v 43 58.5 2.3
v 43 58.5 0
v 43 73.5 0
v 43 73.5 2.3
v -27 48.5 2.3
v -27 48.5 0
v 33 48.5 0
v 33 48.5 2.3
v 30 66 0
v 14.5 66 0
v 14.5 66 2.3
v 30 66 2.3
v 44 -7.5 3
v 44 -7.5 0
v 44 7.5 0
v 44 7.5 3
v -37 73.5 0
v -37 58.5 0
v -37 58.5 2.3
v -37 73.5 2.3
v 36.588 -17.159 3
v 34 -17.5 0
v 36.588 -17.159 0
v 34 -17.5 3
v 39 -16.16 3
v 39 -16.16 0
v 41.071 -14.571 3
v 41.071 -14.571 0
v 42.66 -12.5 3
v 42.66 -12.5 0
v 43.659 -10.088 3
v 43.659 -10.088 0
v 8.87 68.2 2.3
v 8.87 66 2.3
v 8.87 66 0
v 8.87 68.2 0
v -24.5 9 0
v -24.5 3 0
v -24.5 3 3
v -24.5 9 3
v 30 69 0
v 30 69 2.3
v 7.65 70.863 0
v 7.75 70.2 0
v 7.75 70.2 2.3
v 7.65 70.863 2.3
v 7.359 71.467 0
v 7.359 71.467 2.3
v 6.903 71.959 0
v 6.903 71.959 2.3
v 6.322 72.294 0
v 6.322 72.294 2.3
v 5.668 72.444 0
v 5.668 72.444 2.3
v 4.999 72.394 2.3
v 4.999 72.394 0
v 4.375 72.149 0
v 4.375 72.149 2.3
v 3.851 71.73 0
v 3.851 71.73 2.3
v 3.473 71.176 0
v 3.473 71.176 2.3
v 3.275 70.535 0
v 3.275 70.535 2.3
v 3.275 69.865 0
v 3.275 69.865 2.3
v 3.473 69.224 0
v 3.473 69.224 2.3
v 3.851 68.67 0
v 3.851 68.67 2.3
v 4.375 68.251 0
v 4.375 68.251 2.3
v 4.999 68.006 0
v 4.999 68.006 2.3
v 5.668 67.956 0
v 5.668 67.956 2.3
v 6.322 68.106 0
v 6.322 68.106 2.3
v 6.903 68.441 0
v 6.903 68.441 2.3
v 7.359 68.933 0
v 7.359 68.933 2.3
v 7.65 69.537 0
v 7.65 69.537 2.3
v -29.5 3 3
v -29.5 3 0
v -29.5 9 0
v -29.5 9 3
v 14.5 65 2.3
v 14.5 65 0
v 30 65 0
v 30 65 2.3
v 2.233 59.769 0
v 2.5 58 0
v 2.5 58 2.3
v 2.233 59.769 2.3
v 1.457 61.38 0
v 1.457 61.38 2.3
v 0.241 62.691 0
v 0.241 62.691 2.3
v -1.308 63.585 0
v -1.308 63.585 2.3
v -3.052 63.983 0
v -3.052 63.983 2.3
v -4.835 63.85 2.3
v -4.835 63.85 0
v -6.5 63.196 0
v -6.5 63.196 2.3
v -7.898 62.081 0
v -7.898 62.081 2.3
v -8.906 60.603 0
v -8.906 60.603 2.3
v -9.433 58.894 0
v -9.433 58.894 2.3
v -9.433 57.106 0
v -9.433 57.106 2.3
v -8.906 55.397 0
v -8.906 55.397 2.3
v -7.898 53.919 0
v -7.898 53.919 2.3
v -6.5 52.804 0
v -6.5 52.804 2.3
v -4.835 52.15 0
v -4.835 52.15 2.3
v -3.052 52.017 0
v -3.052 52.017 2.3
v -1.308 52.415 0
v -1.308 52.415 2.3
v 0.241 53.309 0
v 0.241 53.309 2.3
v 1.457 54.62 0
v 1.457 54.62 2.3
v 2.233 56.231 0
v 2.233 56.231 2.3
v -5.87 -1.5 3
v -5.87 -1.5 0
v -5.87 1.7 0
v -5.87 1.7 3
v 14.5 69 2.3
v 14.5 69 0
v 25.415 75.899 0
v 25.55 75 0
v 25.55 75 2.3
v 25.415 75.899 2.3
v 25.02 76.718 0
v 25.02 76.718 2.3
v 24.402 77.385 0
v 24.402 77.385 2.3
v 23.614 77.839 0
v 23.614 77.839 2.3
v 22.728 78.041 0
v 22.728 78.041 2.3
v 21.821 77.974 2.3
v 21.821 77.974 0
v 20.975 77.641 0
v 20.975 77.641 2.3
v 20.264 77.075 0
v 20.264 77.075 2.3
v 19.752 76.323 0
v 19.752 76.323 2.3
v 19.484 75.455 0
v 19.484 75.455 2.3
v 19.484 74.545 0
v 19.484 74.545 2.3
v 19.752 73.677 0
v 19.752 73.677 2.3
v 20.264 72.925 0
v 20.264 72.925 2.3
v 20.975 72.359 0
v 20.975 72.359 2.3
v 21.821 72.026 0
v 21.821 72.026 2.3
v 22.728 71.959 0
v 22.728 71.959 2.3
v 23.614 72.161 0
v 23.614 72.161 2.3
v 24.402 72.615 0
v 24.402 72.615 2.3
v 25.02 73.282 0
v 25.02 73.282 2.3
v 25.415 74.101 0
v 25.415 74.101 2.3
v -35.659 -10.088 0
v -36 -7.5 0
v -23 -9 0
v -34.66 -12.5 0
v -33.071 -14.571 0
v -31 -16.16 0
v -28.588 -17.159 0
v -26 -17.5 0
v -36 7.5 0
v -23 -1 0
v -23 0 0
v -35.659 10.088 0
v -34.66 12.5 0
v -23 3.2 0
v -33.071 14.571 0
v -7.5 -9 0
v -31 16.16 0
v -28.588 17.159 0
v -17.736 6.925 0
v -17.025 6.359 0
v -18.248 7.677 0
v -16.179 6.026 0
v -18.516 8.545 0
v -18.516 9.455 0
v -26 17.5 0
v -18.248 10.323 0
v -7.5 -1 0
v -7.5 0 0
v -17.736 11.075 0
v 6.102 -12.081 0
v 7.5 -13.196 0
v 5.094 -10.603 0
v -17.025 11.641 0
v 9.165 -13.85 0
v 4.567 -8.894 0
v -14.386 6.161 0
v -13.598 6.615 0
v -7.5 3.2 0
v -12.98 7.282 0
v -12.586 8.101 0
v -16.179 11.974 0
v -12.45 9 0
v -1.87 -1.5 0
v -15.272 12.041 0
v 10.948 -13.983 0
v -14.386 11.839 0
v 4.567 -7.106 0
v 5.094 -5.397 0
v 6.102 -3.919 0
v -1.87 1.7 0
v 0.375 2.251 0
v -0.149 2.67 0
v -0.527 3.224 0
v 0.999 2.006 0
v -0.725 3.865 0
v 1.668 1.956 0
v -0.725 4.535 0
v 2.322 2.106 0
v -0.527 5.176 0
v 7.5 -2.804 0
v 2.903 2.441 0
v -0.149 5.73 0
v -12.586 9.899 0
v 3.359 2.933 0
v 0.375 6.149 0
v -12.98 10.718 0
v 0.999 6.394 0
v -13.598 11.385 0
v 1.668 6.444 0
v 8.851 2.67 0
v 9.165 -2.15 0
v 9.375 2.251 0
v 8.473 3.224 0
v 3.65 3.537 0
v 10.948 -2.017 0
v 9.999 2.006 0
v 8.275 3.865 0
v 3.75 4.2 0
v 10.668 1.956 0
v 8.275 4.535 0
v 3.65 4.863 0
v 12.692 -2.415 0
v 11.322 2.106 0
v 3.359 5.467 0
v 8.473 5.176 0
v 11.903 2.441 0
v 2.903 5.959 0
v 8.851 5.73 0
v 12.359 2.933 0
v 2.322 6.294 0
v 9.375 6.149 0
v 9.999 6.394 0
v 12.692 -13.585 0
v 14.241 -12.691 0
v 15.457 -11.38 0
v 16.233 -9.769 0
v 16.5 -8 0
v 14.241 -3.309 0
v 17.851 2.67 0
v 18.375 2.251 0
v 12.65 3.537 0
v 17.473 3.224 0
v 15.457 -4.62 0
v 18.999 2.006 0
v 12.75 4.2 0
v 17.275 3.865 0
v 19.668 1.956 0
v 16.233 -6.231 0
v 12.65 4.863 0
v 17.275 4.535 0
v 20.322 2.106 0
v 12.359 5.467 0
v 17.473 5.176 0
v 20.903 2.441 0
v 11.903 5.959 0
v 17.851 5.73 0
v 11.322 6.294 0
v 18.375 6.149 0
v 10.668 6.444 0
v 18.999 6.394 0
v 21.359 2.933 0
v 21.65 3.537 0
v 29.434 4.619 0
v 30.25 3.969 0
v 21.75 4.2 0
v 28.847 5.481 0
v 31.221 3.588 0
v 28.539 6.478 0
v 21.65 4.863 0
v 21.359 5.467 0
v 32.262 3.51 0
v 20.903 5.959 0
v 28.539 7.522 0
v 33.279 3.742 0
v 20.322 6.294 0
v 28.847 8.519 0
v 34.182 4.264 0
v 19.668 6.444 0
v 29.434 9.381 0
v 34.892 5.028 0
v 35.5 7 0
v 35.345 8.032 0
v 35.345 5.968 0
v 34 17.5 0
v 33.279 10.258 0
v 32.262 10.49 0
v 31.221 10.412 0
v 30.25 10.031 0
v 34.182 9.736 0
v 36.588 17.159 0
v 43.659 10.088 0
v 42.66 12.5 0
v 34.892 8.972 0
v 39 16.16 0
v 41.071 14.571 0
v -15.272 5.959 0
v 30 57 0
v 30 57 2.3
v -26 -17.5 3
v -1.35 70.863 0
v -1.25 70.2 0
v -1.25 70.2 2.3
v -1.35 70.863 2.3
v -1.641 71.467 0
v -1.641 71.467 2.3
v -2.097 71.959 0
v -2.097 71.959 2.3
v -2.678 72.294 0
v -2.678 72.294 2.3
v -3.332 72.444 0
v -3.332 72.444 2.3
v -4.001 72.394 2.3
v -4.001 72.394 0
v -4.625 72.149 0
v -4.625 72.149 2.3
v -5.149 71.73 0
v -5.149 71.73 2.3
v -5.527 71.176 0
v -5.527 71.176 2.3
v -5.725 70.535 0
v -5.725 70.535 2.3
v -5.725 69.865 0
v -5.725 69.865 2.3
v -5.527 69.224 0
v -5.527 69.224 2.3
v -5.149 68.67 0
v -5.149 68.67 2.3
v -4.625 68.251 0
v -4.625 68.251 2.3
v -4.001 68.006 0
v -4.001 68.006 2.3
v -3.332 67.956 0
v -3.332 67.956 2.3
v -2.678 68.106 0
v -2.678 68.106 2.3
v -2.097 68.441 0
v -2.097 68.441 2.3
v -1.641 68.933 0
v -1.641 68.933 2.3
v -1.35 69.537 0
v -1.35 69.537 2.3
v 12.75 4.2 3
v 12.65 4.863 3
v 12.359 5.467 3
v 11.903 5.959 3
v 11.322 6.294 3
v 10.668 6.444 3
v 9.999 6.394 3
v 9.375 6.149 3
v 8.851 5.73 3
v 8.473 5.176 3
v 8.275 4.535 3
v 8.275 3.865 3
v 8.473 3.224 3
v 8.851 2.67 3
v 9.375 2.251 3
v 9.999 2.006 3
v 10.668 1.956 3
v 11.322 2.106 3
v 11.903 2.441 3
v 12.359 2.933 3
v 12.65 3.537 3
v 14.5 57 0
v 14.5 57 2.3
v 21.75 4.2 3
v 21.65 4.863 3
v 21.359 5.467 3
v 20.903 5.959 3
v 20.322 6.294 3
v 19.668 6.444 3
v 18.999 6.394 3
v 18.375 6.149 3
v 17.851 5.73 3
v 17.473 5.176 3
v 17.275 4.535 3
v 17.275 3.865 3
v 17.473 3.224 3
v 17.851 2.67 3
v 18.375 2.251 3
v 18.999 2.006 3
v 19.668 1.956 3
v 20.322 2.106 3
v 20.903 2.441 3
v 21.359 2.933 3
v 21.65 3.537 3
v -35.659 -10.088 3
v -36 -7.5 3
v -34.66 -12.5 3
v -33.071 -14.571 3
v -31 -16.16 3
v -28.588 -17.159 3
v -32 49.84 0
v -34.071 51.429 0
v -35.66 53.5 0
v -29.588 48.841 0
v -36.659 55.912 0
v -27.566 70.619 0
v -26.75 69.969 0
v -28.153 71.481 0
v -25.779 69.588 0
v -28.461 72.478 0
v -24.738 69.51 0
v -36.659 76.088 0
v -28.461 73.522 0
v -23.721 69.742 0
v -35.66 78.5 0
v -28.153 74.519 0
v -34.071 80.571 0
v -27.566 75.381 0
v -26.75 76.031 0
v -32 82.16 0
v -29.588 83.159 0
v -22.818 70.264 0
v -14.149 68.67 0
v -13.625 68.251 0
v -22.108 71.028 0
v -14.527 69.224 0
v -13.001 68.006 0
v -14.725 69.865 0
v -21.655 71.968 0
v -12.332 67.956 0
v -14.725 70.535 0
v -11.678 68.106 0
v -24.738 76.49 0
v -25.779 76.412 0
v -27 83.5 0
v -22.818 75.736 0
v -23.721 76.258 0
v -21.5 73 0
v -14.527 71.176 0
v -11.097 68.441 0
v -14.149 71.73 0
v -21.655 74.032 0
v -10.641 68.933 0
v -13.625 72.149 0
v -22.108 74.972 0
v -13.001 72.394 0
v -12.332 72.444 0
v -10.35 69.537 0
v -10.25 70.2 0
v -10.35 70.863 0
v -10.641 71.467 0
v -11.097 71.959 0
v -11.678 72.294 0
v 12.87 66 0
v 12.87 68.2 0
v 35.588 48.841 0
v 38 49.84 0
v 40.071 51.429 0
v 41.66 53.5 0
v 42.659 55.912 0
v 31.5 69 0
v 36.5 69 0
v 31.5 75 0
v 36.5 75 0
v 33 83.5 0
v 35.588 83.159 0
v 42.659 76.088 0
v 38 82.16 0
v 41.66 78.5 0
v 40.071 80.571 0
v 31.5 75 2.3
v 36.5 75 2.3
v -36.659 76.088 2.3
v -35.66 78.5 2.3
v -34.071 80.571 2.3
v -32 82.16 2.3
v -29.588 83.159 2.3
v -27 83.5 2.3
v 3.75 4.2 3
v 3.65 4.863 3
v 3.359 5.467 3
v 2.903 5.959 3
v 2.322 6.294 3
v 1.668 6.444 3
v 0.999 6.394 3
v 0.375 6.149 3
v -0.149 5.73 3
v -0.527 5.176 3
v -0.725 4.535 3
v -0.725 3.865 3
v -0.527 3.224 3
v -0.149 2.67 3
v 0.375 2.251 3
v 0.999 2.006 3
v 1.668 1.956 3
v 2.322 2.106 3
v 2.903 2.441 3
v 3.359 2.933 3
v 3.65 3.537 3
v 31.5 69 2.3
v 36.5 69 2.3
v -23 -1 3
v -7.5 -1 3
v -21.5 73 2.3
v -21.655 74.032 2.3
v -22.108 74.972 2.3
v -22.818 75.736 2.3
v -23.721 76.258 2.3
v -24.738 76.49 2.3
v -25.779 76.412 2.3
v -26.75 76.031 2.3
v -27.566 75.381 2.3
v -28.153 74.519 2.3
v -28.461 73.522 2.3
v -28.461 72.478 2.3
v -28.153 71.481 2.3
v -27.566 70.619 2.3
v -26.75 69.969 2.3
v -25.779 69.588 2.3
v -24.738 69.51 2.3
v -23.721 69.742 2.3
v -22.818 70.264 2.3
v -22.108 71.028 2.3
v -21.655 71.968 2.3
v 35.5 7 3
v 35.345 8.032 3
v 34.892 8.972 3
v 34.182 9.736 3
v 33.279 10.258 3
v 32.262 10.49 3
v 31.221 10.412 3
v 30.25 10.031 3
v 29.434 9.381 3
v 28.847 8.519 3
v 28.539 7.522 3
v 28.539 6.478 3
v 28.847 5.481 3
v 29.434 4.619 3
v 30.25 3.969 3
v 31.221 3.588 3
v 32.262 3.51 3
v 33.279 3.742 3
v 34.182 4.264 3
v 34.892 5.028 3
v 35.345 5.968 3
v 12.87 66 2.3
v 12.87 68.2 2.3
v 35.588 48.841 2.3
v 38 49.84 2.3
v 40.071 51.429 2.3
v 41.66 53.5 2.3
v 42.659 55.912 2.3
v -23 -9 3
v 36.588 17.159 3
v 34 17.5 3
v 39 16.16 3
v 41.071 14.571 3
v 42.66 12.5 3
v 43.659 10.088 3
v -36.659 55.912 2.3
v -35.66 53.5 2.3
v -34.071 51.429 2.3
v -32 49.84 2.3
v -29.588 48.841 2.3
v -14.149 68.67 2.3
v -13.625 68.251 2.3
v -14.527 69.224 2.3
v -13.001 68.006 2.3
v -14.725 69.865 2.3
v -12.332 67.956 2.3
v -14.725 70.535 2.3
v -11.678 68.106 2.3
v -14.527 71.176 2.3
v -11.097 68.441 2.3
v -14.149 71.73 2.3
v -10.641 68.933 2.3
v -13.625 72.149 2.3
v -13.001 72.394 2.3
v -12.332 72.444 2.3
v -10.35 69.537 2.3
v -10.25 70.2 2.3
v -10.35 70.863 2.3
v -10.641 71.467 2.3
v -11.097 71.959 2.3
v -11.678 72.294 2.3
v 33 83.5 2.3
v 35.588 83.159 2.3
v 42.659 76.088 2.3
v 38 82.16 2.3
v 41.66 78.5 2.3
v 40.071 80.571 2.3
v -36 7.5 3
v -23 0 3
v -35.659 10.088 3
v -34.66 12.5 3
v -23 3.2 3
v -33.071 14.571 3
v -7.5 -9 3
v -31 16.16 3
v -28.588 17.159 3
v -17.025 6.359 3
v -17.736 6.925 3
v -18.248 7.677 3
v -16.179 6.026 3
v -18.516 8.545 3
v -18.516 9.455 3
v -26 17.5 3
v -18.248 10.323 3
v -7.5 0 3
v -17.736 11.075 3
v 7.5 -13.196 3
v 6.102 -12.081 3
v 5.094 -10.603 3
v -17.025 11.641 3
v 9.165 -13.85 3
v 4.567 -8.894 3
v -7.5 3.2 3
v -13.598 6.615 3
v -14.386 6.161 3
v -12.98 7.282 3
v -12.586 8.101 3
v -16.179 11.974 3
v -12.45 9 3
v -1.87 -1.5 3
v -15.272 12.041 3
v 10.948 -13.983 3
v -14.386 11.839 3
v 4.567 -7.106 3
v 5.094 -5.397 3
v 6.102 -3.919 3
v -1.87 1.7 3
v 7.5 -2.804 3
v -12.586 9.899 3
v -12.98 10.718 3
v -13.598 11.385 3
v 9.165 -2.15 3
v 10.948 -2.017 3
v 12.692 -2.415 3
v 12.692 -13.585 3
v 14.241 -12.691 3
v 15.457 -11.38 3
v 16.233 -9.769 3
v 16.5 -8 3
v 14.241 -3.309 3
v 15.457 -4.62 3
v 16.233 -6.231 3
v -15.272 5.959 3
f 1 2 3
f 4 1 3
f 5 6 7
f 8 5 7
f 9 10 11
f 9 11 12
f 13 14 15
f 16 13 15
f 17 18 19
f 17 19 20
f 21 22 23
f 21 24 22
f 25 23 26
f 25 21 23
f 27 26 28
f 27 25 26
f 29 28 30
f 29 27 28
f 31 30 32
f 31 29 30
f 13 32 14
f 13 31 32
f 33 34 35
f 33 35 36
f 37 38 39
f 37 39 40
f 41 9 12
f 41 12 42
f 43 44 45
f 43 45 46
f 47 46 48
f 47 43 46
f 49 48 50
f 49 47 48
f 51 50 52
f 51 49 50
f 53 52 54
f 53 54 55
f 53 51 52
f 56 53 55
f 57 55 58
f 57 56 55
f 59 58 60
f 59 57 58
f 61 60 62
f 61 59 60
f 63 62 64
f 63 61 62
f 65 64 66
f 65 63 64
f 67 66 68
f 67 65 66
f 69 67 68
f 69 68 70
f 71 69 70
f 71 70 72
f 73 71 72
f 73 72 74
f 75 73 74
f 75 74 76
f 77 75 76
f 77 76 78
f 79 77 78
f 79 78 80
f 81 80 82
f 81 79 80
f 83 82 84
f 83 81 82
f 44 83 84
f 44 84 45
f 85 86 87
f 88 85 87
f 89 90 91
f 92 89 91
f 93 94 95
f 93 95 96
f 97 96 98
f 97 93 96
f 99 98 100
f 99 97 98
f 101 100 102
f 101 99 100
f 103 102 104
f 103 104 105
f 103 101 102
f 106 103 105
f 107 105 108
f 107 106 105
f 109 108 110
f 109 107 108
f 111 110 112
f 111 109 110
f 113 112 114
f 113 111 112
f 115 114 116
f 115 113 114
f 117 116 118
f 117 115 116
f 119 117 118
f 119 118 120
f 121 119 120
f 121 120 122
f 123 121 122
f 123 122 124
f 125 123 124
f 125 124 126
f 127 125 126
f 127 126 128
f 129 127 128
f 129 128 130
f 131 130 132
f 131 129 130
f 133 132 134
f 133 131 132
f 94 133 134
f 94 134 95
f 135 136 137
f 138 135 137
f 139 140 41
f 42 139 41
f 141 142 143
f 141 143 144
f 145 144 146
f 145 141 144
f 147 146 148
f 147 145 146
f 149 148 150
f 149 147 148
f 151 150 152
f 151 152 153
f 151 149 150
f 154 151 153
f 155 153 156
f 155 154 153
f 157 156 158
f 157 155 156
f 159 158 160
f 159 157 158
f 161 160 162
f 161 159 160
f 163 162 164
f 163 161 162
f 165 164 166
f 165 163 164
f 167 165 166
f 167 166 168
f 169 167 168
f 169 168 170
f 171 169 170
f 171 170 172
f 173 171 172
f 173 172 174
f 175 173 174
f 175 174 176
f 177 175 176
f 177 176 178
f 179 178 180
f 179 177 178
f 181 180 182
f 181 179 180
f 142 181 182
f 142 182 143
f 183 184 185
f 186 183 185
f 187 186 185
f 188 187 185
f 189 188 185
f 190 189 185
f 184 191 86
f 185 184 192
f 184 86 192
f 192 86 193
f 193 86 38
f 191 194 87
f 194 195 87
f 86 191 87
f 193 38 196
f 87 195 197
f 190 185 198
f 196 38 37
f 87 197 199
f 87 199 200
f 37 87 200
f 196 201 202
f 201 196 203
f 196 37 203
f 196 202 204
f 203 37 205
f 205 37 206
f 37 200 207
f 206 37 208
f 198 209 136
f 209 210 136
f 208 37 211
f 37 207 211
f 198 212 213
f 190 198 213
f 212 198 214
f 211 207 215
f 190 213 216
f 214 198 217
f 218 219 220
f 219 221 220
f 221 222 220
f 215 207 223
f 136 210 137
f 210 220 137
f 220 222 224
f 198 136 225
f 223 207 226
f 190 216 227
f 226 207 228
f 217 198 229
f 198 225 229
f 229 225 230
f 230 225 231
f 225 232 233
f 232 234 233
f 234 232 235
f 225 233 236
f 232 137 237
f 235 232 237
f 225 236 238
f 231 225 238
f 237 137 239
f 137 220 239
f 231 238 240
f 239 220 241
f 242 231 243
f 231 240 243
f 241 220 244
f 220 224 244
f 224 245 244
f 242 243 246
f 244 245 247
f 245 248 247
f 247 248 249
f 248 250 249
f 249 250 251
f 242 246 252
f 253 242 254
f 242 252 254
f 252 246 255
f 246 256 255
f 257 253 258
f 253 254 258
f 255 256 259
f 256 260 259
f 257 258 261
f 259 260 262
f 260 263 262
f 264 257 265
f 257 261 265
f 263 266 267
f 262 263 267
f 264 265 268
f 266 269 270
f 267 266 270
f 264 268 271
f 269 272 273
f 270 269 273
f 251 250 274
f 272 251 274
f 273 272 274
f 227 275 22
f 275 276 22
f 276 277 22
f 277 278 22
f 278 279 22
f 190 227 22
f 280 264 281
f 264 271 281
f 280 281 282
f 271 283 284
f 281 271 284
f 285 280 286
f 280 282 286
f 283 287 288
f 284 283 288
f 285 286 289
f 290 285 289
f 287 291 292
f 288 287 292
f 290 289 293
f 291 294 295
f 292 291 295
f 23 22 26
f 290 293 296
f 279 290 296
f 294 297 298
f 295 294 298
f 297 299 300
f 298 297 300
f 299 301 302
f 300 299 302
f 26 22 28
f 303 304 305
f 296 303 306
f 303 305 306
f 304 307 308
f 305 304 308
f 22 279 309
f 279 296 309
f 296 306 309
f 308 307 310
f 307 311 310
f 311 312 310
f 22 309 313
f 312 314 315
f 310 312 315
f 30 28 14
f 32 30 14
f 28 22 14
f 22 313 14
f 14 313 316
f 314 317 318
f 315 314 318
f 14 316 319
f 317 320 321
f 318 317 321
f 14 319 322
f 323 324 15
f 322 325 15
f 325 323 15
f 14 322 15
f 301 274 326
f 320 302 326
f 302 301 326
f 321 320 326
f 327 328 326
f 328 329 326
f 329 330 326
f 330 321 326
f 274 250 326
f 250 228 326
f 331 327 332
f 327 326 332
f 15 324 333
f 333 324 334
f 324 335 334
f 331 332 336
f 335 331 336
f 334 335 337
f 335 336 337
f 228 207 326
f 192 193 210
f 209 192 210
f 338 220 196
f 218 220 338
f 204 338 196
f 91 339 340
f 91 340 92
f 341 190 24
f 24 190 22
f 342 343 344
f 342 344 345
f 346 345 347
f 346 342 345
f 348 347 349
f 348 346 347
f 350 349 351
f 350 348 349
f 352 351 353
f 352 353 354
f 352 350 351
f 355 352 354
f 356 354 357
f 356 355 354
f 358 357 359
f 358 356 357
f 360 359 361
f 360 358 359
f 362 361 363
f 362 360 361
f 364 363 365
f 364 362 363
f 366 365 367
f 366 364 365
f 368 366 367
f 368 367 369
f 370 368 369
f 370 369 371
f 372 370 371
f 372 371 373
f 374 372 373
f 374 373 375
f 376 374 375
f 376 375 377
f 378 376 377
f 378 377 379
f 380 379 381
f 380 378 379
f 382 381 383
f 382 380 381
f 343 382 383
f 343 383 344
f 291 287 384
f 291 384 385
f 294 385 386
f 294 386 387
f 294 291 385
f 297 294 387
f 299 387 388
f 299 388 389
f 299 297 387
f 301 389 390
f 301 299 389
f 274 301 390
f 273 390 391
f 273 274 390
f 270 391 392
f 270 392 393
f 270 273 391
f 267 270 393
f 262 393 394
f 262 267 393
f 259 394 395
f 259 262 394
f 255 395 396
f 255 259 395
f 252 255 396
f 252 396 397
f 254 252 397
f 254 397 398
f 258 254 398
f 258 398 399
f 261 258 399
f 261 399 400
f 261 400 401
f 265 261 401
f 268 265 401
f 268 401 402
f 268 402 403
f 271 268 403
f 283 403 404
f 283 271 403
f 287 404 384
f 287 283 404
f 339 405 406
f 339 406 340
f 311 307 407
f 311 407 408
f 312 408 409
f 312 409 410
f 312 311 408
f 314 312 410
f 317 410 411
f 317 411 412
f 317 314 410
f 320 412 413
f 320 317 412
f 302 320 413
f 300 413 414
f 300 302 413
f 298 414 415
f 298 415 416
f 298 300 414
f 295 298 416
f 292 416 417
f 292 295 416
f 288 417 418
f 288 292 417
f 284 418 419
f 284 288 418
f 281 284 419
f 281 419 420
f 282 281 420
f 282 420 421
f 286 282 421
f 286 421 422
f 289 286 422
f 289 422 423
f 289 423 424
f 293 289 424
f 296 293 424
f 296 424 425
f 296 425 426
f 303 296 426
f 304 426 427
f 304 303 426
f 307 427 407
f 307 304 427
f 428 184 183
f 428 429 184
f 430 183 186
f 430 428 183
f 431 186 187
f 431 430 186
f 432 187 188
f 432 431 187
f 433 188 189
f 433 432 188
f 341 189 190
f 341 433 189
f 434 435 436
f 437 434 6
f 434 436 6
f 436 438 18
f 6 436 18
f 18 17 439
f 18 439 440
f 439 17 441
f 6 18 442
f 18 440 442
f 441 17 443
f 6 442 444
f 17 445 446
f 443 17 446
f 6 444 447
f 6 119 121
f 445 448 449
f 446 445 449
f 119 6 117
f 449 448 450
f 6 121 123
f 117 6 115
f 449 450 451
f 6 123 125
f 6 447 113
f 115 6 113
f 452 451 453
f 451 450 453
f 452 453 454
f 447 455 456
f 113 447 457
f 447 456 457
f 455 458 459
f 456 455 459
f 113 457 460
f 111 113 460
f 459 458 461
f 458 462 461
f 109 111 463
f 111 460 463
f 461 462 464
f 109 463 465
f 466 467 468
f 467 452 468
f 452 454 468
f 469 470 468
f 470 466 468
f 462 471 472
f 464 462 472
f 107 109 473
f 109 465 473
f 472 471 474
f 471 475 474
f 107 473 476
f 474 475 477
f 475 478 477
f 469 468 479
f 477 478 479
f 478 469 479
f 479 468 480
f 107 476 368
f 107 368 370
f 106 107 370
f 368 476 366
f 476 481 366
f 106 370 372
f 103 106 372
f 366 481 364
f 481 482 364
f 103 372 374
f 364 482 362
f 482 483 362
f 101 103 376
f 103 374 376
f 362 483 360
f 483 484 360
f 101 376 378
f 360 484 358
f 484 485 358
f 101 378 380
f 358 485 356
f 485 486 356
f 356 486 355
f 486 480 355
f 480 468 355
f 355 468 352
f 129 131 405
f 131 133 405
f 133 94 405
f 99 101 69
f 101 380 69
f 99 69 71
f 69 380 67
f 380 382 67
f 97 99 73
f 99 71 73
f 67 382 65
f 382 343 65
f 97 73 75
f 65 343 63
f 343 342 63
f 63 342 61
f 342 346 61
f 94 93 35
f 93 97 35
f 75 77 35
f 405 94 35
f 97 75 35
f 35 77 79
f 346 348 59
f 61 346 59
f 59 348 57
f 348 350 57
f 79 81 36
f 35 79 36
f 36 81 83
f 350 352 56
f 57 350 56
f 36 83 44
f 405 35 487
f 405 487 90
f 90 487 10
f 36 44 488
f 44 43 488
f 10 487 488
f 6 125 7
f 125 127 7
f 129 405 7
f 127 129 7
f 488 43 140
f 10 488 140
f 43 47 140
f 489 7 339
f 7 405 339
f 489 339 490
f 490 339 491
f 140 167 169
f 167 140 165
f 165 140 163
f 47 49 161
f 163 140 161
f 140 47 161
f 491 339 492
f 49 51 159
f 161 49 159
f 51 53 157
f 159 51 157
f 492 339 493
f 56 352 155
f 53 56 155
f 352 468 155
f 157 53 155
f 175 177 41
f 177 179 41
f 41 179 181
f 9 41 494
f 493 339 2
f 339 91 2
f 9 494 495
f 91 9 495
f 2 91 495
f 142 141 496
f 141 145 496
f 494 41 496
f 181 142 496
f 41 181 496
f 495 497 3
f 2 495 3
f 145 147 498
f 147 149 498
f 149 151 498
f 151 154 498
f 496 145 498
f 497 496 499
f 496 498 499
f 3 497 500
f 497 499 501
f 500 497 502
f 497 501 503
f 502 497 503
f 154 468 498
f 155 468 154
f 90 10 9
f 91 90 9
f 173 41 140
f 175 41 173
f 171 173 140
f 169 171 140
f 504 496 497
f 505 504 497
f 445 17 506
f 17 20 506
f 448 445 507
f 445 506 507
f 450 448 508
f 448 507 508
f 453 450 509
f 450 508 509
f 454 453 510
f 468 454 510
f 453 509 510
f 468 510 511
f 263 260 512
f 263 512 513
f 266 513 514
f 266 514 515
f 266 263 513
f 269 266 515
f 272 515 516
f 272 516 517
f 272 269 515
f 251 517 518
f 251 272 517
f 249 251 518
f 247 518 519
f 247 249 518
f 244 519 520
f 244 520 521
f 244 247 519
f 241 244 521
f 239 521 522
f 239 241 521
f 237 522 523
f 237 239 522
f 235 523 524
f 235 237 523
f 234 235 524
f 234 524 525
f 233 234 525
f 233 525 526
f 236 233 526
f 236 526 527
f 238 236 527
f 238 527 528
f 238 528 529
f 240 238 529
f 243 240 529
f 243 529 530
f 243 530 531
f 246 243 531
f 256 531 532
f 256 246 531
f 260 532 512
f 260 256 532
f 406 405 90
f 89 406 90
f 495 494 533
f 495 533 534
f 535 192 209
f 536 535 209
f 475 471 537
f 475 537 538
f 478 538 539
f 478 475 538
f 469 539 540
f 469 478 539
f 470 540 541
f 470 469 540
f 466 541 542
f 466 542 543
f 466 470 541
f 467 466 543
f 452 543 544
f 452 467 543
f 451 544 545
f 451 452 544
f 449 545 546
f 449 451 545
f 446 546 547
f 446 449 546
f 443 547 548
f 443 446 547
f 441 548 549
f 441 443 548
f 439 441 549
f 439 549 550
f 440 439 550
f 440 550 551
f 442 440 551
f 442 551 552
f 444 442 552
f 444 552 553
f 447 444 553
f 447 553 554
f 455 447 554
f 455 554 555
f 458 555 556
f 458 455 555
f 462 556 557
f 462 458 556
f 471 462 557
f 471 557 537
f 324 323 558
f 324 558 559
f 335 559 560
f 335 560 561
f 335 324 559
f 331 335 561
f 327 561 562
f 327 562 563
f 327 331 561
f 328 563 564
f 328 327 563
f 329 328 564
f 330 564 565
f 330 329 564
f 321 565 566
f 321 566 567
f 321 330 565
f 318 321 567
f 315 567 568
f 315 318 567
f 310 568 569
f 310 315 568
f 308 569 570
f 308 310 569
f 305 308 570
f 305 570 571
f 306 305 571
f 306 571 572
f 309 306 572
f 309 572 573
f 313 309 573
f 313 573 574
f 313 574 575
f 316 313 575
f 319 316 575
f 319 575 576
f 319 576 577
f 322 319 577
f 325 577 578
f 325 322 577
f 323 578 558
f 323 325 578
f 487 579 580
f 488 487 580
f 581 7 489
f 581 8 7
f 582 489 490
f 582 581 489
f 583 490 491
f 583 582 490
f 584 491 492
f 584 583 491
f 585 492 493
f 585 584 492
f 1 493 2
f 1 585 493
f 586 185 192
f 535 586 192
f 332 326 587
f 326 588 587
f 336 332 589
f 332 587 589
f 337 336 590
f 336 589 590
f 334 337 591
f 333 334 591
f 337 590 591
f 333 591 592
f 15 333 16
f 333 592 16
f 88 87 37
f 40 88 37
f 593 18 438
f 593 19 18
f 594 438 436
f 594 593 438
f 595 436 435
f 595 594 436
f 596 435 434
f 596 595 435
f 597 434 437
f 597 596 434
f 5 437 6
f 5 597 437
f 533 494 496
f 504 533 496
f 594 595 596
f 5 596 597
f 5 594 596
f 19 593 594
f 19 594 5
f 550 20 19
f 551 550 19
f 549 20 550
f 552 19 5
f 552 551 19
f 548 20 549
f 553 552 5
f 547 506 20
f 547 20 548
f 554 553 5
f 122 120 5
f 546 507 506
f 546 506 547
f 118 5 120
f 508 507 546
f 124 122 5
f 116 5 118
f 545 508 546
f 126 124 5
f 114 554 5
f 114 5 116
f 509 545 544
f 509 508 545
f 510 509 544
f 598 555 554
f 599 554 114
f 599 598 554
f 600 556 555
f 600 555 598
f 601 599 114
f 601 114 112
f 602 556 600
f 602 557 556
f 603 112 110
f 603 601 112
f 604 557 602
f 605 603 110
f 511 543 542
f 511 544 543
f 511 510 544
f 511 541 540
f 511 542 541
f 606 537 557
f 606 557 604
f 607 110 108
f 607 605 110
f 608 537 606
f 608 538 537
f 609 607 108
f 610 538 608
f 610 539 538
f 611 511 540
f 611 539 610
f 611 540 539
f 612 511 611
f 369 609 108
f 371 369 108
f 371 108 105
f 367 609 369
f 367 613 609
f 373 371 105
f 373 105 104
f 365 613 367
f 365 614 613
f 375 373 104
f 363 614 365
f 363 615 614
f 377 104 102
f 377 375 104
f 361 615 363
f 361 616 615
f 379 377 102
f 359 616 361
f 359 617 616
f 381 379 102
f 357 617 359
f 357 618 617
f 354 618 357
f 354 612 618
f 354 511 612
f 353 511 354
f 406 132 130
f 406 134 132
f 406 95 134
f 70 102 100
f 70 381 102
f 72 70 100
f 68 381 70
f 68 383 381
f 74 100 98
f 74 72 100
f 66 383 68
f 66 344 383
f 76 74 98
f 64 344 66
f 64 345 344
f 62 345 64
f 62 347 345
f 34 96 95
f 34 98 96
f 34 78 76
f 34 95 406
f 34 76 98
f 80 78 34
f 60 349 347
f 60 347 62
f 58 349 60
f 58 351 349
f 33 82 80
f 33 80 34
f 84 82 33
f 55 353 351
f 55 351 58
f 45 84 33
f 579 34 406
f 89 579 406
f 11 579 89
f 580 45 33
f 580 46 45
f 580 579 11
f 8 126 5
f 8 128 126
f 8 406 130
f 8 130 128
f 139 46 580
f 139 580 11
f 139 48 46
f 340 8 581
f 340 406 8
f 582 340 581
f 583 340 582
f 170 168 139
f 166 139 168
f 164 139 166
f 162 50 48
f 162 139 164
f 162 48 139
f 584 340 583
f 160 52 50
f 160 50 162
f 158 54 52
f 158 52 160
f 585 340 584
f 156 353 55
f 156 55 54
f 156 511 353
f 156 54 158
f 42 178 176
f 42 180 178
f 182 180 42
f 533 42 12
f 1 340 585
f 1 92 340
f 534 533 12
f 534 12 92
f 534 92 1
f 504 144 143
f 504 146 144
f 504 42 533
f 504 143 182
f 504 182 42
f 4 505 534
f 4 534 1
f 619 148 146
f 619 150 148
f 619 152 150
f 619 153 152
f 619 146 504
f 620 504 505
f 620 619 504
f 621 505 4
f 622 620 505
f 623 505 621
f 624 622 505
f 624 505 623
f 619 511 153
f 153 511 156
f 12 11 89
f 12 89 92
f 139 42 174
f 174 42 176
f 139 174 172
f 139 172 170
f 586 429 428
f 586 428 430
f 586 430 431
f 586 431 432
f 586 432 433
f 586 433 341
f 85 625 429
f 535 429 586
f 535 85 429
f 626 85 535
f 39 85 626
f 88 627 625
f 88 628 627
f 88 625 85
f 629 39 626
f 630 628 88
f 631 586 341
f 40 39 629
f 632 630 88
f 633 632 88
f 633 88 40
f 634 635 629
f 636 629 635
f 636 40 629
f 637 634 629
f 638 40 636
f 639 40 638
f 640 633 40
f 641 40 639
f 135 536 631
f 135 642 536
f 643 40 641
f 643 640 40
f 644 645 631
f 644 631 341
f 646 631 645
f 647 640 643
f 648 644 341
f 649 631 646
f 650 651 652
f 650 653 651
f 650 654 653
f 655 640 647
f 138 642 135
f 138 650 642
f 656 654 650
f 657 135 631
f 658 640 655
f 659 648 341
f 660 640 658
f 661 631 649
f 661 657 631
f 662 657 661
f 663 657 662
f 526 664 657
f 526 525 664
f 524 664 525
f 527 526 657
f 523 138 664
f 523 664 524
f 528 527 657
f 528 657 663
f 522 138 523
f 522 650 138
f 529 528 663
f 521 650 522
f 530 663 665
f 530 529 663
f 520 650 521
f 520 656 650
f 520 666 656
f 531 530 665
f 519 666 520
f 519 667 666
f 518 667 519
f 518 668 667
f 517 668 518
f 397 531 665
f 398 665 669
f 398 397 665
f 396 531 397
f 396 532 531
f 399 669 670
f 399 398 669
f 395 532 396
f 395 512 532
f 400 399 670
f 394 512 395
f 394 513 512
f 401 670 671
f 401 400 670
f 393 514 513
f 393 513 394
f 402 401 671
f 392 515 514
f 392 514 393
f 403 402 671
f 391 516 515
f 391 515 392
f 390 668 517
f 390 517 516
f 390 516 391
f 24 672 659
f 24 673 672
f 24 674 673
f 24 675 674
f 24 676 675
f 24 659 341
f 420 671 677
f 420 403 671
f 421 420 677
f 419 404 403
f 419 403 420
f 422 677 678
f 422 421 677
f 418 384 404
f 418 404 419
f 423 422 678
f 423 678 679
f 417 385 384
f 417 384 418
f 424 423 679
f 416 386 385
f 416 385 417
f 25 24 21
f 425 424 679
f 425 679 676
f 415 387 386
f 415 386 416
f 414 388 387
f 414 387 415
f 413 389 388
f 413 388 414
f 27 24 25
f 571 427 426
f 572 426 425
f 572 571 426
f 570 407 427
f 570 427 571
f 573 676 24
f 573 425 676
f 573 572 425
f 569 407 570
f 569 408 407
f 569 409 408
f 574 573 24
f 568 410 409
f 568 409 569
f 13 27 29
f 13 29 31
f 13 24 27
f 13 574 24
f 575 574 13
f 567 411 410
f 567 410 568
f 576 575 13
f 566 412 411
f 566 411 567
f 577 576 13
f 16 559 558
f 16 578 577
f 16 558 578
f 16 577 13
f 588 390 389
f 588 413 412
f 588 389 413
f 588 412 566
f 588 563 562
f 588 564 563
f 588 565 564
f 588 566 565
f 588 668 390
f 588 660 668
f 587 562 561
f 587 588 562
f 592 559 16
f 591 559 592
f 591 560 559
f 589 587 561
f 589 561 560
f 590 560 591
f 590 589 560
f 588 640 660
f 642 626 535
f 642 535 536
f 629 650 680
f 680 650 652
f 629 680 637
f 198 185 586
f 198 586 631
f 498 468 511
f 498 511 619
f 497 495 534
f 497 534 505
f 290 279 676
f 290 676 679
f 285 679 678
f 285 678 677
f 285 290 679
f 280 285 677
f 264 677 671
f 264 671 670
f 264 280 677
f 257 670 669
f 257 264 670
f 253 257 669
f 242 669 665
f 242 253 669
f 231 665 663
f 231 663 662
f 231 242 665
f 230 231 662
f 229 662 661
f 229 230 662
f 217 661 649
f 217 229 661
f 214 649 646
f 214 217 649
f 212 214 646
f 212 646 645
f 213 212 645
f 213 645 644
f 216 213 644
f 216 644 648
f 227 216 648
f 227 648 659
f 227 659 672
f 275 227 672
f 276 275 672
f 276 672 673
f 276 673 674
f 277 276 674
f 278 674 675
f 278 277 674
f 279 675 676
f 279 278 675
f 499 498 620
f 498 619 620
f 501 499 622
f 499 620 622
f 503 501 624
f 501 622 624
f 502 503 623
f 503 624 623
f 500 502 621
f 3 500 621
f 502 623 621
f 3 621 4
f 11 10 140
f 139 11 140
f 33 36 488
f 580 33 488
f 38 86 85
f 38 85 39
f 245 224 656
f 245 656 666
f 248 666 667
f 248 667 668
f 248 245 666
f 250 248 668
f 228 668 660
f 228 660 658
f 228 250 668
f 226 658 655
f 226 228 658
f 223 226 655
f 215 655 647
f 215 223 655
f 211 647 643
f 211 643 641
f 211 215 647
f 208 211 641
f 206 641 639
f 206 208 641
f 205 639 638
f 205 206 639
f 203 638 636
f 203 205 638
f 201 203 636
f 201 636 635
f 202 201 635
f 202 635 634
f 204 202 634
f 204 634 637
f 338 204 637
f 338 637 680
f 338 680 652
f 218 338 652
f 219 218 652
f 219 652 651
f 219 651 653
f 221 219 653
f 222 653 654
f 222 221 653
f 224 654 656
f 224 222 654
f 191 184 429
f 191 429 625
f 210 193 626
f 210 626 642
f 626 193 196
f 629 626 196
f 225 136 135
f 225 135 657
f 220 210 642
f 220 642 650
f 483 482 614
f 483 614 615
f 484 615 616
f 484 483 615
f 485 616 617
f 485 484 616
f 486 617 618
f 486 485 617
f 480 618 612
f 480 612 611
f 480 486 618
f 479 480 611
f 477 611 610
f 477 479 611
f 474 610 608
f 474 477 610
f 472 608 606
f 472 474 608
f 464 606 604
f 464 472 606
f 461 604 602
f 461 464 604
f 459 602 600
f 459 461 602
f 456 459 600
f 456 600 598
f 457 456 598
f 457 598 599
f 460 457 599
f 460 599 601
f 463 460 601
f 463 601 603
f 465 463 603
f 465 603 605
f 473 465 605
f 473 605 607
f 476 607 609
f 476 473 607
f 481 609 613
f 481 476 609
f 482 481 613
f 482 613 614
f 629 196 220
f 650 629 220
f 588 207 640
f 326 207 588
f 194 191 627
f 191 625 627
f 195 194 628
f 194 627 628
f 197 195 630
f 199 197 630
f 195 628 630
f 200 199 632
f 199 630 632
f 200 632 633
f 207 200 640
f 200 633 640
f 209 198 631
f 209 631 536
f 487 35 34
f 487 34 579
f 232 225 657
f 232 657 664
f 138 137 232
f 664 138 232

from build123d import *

# Parameters (mm, degrees)
F0_W     = 80
F0_H     = 35
F0_R     = 6
F0_R_2   = 3.5
F0_R_3   = 2.25
F0_W_2   = 4
F0_H_2   = 2.2
F0_W_3   = 15.5
F0_H_3   = 8
F0_H_4   = 3
F0_R_4   = 3.05
F0_W_4   = 5
F0_H_5   = 6
F1_DEPTH = 2.3
F2_R     = 10
F0_H_6   = 3.2
F3_DEPTH = 3
F4_R     = 10


with BuildPart() as f1:
    # F0 (on Top) → F1 (new body)
    with BuildSketch(Plane.XY):
        with Locations((3.000022, 66.000001)):
            Rectangle(F0_W, F0_H)
        with Locations((-3.499978, 58.000001)):
            Circle(F0_R, mode=Mode.SUBTRACT)
        with Locations((-24.999978, 73.000001)):
            Circle(F0_R_2, mode=Mode.SUBTRACT)
        with Locations((-12.499978, 70.200001)):
            Circle(F0_R_3, mode=Mode.SUBTRACT)
        with Locations((-3.499978, 70.200001)):
            Circle(F0_R_3, mode=Mode.SUBTRACT)
        with Locations((5.500022, 70.200001)):
            Circle(F0_R_3, mode=Mode.SUBTRACT)
        with Locations((10.870362, 67.100001)):
            Rectangle(F0_W_2, F0_H_2, mode=Mode.SUBTRACT)
        with Locations((22.250022, 61.000001)):
            Rectangle(F0_W_3, F0_H_3, mode=Mode.SUBTRACT)
        with Locations((22.250022, 67.500001)):
            Rectangle(F0_W_3, F0_H_4, mode=Mode.SUBTRACT)
        with Locations((22.500022, 75.000001)):
            Circle(F0_R_4, mode=Mode.SUBTRACT)
        with Locations((34.000022, 72.000001)):
            Rectangle(F0_W_4, F0_H_5, mode=Mode.SUBTRACT)
    extrude(amount=F1_DEPTH)

    # F2
    f2_edges = [f1.edges().sort_by_distance(p)[0] for p in [
        (43.000022, 83.500001, 1.15),
        (43.000022, 48.500001, 1.15),
        (-36.999978, 48.500001, 1.15),
        (-36.999978, 83.500001, 1.15),
    ]]
    fillet(f2_edges, radius=F2_R)


with BuildPart() as f3:
    # F0 (on Top) → F3 (new body)
    with BuildSketch(Plane.XY):
        with Locations((3.999998, 0)):
            Rectangle(F0_W, F0_H)
        with Locations((-27.000002, 6)):
            Rectangle(F0_W_4, F0_H_5, mode=Mode.SUBTRACT)
        with Locations((-15.250002, -5)):
            Rectangle(F0_W_3, F0_H_3, mode=Mode.SUBTRACT)
        with Locations((-15.250002, 1.6)):
            Rectangle(F0_W_3, F0_H_6, mode=Mode.SUBTRACT)
        with Locations((-3.870343, 0.1)):
            Rectangle(F0_W_2, F0_H_6, mode=Mode.SUBTRACT)
        with Locations((1.499998, 4.2)):
            Circle(F0_R_3, mode=Mode.SUBTRACT)
        with Locations((-15.500002, 9)):
            Circle(F0_R_4, mode=Mode.SUBTRACT)
        with Locations((10.499998, -8)):
            Circle(F0_R, mode=Mode.SUBTRACT)
        with Locations((10.499998, 4.2)):
            Circle(F0_R_3, mode=Mode.SUBTRACT)
        with Locations((19.499998, 4.2)):
            Circle(F0_R_3, mode=Mode.SUBTRACT)
        with Locations((31.999998, 7)):
            Circle(F0_R_2, mode=Mode.SUBTRACT)
    extrude(amount=F3_DEPTH)

    # F4
    f4_edges = [f3.edges().sort_by_distance(p)[0] for p in [
        (-36.000002, 17.5, 1.5),
        (-36.000002, -17.5, 1.5),
        (43.999998, 17.5, 1.5),
        (43.999998, -17.5, 1.5),
    ]]
    fillet(f4_edges, radius=F4_R)


solid = Compound([f1.part, f3.part])
